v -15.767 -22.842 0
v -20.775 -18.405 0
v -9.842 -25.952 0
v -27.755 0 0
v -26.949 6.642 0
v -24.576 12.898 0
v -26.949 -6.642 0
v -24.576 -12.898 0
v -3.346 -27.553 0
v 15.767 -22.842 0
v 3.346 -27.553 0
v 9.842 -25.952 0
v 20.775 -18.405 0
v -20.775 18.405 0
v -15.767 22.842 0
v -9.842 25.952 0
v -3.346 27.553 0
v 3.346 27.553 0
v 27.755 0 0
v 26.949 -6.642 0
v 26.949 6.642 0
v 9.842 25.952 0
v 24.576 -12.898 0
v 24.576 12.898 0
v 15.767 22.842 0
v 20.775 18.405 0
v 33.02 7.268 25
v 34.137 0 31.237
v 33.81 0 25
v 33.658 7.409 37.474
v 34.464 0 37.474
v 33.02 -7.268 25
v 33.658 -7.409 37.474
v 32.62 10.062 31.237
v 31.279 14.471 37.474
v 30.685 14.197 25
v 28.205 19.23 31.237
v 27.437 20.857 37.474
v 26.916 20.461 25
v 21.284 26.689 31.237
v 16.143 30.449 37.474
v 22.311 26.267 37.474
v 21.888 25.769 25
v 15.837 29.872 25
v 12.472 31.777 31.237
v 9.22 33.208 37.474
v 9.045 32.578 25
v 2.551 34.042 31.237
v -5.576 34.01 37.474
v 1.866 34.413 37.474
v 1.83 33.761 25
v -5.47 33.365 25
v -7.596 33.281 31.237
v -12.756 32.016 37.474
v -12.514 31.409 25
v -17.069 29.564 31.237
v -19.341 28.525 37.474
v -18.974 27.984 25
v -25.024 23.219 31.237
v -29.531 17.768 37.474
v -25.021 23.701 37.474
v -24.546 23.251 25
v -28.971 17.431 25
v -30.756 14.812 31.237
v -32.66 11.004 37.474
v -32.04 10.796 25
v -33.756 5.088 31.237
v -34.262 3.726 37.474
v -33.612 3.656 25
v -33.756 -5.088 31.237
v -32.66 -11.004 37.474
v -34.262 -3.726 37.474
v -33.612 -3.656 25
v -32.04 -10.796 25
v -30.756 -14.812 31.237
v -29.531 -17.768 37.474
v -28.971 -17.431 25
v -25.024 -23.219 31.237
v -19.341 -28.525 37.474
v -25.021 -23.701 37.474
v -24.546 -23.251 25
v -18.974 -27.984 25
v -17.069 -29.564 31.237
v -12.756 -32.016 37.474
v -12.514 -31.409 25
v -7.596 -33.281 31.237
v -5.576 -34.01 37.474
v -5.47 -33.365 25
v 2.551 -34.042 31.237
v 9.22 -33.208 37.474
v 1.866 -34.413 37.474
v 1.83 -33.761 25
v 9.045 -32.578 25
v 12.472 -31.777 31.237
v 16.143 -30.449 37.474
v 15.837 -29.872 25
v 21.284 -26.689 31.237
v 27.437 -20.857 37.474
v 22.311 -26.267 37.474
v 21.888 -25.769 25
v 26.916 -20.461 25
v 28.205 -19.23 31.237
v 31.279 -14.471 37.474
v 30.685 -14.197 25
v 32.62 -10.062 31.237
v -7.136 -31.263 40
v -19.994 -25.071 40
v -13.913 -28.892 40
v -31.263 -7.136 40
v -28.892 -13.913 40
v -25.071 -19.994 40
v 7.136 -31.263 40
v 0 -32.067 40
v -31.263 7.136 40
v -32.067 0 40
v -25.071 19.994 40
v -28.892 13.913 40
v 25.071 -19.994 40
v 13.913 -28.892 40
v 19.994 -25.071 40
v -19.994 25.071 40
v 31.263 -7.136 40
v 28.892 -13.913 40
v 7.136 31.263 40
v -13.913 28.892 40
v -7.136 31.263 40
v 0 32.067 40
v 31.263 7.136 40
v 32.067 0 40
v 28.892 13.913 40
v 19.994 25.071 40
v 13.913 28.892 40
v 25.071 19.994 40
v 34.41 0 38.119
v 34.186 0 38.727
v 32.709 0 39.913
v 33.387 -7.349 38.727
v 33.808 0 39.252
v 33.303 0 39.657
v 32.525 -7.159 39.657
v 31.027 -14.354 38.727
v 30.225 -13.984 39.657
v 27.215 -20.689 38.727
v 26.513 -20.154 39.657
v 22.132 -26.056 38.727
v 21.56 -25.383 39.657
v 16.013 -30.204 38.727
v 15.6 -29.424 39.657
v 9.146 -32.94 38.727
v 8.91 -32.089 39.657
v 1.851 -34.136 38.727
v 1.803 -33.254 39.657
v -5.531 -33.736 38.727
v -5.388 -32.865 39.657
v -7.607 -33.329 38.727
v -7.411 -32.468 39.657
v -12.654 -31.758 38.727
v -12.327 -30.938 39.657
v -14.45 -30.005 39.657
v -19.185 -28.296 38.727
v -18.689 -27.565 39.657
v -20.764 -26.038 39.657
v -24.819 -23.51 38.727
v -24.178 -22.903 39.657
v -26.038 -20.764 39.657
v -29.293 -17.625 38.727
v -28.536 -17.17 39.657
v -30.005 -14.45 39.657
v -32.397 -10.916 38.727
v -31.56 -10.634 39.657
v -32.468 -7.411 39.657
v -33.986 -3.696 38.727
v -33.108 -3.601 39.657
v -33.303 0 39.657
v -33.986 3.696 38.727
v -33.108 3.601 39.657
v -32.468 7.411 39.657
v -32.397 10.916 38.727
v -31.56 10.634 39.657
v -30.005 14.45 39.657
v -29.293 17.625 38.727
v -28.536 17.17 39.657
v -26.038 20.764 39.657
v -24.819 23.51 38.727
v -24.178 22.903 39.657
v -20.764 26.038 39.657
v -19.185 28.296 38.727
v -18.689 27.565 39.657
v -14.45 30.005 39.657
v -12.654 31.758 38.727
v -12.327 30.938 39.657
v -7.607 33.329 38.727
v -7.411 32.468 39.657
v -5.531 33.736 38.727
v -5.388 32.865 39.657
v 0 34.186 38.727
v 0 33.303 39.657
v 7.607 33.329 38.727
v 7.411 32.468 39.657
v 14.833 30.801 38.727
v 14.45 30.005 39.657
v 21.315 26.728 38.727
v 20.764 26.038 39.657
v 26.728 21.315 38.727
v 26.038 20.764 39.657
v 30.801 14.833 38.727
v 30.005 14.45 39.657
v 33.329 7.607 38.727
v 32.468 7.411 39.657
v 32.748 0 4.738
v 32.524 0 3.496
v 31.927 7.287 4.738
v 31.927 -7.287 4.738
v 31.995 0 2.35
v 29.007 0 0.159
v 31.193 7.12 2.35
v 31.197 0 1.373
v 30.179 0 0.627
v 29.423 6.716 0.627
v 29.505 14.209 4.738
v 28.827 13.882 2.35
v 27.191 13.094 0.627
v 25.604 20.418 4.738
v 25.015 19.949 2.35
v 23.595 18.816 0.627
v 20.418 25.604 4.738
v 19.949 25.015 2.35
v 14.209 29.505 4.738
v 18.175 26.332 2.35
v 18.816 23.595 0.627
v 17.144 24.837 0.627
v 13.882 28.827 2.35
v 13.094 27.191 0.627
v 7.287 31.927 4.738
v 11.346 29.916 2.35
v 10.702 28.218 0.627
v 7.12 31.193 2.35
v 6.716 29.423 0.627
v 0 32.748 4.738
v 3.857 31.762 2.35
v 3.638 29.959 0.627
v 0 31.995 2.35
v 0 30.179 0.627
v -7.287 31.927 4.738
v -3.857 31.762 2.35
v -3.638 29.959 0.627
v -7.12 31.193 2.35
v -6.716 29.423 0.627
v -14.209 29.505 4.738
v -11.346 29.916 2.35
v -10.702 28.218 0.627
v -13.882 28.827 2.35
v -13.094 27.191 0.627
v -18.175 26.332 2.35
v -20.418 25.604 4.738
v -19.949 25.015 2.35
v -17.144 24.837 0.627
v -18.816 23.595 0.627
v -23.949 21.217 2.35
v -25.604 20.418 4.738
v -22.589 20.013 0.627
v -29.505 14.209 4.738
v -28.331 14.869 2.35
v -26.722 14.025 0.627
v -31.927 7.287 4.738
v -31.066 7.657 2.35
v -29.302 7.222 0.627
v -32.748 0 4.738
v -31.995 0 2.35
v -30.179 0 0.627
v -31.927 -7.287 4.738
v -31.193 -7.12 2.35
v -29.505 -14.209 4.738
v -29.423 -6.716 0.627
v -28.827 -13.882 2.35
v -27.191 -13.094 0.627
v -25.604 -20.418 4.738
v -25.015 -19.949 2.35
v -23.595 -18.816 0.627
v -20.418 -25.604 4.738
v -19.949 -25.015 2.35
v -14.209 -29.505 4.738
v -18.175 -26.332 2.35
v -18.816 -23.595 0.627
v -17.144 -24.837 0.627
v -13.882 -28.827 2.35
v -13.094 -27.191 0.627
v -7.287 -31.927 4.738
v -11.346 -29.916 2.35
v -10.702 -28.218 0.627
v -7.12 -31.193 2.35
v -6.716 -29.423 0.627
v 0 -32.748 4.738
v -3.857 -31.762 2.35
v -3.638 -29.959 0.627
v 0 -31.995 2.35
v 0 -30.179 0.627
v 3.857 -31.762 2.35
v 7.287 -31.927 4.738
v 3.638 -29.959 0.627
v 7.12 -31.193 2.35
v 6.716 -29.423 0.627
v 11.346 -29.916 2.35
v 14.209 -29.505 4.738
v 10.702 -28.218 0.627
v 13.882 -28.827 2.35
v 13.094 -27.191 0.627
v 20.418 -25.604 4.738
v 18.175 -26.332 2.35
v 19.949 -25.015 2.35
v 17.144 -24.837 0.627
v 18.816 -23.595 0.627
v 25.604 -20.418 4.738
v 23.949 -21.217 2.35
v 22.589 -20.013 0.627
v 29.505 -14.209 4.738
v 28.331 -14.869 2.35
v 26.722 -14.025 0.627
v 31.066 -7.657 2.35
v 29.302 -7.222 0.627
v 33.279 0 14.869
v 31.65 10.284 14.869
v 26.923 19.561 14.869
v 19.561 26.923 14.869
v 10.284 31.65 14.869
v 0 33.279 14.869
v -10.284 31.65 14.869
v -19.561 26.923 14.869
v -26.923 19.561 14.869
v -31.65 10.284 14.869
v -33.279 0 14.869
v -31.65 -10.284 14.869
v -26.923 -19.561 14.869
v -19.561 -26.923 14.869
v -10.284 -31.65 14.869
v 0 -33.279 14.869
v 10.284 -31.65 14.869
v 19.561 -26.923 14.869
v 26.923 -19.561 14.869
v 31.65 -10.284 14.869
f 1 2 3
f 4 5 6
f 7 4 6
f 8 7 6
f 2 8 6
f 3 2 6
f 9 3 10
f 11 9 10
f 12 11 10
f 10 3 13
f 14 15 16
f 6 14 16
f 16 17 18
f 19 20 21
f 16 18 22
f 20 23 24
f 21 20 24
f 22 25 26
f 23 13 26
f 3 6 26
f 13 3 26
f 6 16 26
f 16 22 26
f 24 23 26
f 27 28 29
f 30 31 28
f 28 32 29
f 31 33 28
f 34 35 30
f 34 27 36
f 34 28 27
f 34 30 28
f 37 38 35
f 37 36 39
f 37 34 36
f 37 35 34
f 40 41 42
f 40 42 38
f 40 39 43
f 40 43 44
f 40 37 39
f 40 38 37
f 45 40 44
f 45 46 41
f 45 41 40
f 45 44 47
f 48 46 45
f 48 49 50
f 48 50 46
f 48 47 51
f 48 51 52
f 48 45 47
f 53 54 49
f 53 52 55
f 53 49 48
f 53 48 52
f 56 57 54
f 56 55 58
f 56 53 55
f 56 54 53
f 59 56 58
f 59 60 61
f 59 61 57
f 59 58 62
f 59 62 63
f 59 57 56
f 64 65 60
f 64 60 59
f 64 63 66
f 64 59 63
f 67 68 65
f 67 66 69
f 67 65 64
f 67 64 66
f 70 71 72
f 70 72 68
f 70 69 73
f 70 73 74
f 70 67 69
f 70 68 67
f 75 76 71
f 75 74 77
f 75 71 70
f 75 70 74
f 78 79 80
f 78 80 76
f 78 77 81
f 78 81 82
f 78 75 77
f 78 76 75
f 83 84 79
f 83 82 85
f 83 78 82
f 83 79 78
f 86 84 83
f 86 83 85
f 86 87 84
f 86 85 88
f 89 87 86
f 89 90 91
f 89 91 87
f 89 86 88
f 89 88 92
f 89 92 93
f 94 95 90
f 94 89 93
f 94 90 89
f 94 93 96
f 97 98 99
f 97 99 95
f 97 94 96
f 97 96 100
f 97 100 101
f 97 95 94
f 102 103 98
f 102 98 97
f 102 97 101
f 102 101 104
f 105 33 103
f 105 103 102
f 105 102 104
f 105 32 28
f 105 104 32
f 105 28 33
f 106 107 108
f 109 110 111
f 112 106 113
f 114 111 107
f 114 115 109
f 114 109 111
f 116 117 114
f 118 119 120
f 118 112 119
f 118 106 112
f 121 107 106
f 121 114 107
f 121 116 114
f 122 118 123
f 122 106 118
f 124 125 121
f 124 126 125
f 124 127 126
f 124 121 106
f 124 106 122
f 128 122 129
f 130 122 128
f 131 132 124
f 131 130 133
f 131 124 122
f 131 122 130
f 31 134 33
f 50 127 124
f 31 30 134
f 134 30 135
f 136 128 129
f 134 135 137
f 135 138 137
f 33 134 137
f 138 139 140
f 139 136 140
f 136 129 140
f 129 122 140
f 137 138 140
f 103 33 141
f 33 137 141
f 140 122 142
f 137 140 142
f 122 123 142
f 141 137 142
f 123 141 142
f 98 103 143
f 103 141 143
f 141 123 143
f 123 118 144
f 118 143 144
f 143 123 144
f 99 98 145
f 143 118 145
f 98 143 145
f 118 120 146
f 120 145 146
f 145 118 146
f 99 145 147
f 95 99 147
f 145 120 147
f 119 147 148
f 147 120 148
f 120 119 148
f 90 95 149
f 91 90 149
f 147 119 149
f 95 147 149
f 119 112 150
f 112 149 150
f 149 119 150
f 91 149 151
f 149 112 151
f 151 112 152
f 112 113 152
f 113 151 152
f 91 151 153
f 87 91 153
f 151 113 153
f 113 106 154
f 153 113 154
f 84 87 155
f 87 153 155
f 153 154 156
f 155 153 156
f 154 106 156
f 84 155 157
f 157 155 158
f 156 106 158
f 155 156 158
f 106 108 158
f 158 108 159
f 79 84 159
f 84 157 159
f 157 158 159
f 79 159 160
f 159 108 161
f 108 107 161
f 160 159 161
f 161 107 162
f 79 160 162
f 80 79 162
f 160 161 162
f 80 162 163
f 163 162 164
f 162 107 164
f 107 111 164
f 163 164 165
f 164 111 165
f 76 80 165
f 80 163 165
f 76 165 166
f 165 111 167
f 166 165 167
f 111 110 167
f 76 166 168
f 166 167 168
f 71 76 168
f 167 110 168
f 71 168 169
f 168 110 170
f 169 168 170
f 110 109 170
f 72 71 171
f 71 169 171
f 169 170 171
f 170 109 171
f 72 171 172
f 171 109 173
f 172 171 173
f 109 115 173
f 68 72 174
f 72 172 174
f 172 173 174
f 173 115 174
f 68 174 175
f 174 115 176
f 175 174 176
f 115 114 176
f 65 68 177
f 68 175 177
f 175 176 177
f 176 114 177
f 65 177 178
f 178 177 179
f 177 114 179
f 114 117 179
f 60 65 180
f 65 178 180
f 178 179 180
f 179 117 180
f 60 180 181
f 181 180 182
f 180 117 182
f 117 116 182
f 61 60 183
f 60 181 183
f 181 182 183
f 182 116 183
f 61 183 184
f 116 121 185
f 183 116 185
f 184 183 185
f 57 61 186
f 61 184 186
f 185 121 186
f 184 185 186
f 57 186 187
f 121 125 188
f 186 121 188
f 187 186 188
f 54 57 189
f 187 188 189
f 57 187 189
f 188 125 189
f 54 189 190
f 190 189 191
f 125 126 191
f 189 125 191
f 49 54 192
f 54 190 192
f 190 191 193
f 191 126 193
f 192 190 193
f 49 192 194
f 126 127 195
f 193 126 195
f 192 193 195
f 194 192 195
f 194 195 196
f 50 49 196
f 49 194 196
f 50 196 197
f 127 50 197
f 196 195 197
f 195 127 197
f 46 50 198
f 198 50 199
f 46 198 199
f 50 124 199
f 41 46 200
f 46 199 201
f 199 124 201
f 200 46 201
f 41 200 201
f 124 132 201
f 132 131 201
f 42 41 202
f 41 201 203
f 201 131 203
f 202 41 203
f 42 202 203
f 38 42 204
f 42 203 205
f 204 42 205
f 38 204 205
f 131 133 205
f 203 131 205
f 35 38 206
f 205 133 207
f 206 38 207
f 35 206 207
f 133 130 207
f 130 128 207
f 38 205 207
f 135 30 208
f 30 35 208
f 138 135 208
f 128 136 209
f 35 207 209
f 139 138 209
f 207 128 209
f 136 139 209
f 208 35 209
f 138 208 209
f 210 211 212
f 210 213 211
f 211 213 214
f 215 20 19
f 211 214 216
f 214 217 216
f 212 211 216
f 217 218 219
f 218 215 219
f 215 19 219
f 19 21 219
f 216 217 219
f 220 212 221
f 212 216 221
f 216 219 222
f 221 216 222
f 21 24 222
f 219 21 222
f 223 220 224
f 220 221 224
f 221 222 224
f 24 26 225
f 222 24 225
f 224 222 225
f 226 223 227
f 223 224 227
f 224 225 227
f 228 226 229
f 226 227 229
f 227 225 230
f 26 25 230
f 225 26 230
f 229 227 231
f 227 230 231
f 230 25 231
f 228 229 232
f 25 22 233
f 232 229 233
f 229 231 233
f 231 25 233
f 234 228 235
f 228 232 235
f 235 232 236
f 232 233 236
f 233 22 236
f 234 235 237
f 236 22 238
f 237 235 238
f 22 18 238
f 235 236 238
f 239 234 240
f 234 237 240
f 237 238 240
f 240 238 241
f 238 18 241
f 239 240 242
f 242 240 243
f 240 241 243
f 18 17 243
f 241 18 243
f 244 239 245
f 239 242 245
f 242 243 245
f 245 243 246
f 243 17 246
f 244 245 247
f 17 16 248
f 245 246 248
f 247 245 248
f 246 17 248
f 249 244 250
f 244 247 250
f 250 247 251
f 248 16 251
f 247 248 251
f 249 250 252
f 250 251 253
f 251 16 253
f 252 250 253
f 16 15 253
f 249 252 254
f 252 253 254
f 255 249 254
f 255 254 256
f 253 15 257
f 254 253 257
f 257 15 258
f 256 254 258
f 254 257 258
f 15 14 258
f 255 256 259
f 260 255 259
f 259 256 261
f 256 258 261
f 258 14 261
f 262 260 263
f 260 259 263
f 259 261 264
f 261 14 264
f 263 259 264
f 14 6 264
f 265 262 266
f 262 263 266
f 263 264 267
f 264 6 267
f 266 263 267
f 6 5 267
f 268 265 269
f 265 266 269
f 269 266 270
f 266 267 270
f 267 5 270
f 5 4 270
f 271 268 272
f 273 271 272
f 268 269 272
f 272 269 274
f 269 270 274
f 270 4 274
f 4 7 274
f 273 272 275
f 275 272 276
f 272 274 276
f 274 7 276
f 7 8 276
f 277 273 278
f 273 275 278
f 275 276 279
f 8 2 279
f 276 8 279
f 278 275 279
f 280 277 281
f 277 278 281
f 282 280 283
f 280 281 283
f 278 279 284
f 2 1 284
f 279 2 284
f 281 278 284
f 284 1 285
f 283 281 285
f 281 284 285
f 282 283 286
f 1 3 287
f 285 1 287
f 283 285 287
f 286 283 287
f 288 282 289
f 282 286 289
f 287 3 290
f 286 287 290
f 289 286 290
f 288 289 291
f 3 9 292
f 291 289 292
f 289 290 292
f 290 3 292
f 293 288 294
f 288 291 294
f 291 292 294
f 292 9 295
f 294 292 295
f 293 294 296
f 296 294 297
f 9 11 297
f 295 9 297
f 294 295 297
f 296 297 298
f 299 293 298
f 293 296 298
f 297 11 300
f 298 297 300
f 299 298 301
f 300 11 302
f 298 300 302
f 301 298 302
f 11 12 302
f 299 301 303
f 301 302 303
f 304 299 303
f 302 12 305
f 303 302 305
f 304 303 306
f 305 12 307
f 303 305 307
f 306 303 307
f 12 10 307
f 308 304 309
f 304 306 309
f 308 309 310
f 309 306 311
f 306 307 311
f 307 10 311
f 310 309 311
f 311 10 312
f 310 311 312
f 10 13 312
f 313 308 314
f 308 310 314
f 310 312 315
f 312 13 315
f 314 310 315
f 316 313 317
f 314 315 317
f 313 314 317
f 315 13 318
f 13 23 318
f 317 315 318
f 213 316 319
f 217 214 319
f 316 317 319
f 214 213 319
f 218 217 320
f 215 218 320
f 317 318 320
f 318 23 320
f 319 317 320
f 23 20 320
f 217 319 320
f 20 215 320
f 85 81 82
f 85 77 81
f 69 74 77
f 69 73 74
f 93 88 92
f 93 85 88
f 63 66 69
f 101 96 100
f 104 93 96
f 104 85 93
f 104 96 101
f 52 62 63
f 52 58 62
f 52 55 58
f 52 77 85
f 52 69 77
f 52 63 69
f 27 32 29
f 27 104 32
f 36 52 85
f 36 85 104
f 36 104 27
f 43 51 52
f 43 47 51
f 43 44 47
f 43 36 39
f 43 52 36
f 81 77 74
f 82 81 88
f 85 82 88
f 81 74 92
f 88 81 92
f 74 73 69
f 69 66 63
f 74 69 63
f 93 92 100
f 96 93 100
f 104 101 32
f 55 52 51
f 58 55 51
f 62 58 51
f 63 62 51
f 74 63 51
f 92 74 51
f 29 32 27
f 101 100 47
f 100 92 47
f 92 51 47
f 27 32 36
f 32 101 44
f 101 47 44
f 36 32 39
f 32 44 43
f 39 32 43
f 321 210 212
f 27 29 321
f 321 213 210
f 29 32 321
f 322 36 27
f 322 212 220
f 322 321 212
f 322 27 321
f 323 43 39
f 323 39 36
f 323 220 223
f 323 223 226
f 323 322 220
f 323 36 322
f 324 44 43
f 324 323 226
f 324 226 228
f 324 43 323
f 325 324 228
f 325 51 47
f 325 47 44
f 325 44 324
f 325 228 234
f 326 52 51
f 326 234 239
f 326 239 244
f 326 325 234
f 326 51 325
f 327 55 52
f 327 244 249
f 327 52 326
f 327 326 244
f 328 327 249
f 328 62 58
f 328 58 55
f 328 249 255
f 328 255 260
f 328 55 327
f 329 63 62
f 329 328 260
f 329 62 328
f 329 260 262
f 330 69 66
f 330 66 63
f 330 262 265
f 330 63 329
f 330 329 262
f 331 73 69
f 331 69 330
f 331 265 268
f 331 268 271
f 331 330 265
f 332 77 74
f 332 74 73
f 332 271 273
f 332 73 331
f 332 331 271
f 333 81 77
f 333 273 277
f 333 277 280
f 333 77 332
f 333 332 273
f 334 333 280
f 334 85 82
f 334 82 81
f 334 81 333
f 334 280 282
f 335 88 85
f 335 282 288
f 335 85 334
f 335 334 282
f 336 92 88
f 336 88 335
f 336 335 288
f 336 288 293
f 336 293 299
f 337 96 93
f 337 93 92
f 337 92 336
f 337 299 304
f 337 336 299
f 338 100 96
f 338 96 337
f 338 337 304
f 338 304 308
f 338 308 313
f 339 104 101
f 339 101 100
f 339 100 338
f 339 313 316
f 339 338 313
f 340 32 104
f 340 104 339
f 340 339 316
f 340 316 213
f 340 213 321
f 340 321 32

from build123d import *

# Parameters (mm, degrees)
F0_R     = 32.5
F1_DEPTH = 25
F1_TAPER = -3
F2_R     = 33.8101944821
F3_DEPTH = 15
F3_TAPER = -3
F4_R     = 2.4
F5_R     = 5


with BuildPart() as f1:
    # F0 (on Top) → F1 (new body)
    with BuildSketch(Plane.XY):
        Circle(F0_R)
    extrude(amount=F1_DEPTH, taper=F1_TAPER)

    # F5
    f5_edges = [f1.edges().sort_by_distance(p)[0] for p in [
        (-32.5, 0, 0),
    ]]
    fillet(f5_edges, radius=F5_R)


with BuildPart() as f3:
    # F2 (on face) → F3 (new body)
    with BuildSketch(Plane.XY.offset(25)):
        Circle(F2_R)
    extrude(amount=F3_DEPTH, taper=F3_TAPER)

    # F4
    f4_edges = [f3.edges().sort_by_distance(p)[0] for p in [
        (-34.596311, 0, 40),
    ]]
    fillet(f4_edges, radius=F4_R)


solid = Compound([f1.part, f3.part])
